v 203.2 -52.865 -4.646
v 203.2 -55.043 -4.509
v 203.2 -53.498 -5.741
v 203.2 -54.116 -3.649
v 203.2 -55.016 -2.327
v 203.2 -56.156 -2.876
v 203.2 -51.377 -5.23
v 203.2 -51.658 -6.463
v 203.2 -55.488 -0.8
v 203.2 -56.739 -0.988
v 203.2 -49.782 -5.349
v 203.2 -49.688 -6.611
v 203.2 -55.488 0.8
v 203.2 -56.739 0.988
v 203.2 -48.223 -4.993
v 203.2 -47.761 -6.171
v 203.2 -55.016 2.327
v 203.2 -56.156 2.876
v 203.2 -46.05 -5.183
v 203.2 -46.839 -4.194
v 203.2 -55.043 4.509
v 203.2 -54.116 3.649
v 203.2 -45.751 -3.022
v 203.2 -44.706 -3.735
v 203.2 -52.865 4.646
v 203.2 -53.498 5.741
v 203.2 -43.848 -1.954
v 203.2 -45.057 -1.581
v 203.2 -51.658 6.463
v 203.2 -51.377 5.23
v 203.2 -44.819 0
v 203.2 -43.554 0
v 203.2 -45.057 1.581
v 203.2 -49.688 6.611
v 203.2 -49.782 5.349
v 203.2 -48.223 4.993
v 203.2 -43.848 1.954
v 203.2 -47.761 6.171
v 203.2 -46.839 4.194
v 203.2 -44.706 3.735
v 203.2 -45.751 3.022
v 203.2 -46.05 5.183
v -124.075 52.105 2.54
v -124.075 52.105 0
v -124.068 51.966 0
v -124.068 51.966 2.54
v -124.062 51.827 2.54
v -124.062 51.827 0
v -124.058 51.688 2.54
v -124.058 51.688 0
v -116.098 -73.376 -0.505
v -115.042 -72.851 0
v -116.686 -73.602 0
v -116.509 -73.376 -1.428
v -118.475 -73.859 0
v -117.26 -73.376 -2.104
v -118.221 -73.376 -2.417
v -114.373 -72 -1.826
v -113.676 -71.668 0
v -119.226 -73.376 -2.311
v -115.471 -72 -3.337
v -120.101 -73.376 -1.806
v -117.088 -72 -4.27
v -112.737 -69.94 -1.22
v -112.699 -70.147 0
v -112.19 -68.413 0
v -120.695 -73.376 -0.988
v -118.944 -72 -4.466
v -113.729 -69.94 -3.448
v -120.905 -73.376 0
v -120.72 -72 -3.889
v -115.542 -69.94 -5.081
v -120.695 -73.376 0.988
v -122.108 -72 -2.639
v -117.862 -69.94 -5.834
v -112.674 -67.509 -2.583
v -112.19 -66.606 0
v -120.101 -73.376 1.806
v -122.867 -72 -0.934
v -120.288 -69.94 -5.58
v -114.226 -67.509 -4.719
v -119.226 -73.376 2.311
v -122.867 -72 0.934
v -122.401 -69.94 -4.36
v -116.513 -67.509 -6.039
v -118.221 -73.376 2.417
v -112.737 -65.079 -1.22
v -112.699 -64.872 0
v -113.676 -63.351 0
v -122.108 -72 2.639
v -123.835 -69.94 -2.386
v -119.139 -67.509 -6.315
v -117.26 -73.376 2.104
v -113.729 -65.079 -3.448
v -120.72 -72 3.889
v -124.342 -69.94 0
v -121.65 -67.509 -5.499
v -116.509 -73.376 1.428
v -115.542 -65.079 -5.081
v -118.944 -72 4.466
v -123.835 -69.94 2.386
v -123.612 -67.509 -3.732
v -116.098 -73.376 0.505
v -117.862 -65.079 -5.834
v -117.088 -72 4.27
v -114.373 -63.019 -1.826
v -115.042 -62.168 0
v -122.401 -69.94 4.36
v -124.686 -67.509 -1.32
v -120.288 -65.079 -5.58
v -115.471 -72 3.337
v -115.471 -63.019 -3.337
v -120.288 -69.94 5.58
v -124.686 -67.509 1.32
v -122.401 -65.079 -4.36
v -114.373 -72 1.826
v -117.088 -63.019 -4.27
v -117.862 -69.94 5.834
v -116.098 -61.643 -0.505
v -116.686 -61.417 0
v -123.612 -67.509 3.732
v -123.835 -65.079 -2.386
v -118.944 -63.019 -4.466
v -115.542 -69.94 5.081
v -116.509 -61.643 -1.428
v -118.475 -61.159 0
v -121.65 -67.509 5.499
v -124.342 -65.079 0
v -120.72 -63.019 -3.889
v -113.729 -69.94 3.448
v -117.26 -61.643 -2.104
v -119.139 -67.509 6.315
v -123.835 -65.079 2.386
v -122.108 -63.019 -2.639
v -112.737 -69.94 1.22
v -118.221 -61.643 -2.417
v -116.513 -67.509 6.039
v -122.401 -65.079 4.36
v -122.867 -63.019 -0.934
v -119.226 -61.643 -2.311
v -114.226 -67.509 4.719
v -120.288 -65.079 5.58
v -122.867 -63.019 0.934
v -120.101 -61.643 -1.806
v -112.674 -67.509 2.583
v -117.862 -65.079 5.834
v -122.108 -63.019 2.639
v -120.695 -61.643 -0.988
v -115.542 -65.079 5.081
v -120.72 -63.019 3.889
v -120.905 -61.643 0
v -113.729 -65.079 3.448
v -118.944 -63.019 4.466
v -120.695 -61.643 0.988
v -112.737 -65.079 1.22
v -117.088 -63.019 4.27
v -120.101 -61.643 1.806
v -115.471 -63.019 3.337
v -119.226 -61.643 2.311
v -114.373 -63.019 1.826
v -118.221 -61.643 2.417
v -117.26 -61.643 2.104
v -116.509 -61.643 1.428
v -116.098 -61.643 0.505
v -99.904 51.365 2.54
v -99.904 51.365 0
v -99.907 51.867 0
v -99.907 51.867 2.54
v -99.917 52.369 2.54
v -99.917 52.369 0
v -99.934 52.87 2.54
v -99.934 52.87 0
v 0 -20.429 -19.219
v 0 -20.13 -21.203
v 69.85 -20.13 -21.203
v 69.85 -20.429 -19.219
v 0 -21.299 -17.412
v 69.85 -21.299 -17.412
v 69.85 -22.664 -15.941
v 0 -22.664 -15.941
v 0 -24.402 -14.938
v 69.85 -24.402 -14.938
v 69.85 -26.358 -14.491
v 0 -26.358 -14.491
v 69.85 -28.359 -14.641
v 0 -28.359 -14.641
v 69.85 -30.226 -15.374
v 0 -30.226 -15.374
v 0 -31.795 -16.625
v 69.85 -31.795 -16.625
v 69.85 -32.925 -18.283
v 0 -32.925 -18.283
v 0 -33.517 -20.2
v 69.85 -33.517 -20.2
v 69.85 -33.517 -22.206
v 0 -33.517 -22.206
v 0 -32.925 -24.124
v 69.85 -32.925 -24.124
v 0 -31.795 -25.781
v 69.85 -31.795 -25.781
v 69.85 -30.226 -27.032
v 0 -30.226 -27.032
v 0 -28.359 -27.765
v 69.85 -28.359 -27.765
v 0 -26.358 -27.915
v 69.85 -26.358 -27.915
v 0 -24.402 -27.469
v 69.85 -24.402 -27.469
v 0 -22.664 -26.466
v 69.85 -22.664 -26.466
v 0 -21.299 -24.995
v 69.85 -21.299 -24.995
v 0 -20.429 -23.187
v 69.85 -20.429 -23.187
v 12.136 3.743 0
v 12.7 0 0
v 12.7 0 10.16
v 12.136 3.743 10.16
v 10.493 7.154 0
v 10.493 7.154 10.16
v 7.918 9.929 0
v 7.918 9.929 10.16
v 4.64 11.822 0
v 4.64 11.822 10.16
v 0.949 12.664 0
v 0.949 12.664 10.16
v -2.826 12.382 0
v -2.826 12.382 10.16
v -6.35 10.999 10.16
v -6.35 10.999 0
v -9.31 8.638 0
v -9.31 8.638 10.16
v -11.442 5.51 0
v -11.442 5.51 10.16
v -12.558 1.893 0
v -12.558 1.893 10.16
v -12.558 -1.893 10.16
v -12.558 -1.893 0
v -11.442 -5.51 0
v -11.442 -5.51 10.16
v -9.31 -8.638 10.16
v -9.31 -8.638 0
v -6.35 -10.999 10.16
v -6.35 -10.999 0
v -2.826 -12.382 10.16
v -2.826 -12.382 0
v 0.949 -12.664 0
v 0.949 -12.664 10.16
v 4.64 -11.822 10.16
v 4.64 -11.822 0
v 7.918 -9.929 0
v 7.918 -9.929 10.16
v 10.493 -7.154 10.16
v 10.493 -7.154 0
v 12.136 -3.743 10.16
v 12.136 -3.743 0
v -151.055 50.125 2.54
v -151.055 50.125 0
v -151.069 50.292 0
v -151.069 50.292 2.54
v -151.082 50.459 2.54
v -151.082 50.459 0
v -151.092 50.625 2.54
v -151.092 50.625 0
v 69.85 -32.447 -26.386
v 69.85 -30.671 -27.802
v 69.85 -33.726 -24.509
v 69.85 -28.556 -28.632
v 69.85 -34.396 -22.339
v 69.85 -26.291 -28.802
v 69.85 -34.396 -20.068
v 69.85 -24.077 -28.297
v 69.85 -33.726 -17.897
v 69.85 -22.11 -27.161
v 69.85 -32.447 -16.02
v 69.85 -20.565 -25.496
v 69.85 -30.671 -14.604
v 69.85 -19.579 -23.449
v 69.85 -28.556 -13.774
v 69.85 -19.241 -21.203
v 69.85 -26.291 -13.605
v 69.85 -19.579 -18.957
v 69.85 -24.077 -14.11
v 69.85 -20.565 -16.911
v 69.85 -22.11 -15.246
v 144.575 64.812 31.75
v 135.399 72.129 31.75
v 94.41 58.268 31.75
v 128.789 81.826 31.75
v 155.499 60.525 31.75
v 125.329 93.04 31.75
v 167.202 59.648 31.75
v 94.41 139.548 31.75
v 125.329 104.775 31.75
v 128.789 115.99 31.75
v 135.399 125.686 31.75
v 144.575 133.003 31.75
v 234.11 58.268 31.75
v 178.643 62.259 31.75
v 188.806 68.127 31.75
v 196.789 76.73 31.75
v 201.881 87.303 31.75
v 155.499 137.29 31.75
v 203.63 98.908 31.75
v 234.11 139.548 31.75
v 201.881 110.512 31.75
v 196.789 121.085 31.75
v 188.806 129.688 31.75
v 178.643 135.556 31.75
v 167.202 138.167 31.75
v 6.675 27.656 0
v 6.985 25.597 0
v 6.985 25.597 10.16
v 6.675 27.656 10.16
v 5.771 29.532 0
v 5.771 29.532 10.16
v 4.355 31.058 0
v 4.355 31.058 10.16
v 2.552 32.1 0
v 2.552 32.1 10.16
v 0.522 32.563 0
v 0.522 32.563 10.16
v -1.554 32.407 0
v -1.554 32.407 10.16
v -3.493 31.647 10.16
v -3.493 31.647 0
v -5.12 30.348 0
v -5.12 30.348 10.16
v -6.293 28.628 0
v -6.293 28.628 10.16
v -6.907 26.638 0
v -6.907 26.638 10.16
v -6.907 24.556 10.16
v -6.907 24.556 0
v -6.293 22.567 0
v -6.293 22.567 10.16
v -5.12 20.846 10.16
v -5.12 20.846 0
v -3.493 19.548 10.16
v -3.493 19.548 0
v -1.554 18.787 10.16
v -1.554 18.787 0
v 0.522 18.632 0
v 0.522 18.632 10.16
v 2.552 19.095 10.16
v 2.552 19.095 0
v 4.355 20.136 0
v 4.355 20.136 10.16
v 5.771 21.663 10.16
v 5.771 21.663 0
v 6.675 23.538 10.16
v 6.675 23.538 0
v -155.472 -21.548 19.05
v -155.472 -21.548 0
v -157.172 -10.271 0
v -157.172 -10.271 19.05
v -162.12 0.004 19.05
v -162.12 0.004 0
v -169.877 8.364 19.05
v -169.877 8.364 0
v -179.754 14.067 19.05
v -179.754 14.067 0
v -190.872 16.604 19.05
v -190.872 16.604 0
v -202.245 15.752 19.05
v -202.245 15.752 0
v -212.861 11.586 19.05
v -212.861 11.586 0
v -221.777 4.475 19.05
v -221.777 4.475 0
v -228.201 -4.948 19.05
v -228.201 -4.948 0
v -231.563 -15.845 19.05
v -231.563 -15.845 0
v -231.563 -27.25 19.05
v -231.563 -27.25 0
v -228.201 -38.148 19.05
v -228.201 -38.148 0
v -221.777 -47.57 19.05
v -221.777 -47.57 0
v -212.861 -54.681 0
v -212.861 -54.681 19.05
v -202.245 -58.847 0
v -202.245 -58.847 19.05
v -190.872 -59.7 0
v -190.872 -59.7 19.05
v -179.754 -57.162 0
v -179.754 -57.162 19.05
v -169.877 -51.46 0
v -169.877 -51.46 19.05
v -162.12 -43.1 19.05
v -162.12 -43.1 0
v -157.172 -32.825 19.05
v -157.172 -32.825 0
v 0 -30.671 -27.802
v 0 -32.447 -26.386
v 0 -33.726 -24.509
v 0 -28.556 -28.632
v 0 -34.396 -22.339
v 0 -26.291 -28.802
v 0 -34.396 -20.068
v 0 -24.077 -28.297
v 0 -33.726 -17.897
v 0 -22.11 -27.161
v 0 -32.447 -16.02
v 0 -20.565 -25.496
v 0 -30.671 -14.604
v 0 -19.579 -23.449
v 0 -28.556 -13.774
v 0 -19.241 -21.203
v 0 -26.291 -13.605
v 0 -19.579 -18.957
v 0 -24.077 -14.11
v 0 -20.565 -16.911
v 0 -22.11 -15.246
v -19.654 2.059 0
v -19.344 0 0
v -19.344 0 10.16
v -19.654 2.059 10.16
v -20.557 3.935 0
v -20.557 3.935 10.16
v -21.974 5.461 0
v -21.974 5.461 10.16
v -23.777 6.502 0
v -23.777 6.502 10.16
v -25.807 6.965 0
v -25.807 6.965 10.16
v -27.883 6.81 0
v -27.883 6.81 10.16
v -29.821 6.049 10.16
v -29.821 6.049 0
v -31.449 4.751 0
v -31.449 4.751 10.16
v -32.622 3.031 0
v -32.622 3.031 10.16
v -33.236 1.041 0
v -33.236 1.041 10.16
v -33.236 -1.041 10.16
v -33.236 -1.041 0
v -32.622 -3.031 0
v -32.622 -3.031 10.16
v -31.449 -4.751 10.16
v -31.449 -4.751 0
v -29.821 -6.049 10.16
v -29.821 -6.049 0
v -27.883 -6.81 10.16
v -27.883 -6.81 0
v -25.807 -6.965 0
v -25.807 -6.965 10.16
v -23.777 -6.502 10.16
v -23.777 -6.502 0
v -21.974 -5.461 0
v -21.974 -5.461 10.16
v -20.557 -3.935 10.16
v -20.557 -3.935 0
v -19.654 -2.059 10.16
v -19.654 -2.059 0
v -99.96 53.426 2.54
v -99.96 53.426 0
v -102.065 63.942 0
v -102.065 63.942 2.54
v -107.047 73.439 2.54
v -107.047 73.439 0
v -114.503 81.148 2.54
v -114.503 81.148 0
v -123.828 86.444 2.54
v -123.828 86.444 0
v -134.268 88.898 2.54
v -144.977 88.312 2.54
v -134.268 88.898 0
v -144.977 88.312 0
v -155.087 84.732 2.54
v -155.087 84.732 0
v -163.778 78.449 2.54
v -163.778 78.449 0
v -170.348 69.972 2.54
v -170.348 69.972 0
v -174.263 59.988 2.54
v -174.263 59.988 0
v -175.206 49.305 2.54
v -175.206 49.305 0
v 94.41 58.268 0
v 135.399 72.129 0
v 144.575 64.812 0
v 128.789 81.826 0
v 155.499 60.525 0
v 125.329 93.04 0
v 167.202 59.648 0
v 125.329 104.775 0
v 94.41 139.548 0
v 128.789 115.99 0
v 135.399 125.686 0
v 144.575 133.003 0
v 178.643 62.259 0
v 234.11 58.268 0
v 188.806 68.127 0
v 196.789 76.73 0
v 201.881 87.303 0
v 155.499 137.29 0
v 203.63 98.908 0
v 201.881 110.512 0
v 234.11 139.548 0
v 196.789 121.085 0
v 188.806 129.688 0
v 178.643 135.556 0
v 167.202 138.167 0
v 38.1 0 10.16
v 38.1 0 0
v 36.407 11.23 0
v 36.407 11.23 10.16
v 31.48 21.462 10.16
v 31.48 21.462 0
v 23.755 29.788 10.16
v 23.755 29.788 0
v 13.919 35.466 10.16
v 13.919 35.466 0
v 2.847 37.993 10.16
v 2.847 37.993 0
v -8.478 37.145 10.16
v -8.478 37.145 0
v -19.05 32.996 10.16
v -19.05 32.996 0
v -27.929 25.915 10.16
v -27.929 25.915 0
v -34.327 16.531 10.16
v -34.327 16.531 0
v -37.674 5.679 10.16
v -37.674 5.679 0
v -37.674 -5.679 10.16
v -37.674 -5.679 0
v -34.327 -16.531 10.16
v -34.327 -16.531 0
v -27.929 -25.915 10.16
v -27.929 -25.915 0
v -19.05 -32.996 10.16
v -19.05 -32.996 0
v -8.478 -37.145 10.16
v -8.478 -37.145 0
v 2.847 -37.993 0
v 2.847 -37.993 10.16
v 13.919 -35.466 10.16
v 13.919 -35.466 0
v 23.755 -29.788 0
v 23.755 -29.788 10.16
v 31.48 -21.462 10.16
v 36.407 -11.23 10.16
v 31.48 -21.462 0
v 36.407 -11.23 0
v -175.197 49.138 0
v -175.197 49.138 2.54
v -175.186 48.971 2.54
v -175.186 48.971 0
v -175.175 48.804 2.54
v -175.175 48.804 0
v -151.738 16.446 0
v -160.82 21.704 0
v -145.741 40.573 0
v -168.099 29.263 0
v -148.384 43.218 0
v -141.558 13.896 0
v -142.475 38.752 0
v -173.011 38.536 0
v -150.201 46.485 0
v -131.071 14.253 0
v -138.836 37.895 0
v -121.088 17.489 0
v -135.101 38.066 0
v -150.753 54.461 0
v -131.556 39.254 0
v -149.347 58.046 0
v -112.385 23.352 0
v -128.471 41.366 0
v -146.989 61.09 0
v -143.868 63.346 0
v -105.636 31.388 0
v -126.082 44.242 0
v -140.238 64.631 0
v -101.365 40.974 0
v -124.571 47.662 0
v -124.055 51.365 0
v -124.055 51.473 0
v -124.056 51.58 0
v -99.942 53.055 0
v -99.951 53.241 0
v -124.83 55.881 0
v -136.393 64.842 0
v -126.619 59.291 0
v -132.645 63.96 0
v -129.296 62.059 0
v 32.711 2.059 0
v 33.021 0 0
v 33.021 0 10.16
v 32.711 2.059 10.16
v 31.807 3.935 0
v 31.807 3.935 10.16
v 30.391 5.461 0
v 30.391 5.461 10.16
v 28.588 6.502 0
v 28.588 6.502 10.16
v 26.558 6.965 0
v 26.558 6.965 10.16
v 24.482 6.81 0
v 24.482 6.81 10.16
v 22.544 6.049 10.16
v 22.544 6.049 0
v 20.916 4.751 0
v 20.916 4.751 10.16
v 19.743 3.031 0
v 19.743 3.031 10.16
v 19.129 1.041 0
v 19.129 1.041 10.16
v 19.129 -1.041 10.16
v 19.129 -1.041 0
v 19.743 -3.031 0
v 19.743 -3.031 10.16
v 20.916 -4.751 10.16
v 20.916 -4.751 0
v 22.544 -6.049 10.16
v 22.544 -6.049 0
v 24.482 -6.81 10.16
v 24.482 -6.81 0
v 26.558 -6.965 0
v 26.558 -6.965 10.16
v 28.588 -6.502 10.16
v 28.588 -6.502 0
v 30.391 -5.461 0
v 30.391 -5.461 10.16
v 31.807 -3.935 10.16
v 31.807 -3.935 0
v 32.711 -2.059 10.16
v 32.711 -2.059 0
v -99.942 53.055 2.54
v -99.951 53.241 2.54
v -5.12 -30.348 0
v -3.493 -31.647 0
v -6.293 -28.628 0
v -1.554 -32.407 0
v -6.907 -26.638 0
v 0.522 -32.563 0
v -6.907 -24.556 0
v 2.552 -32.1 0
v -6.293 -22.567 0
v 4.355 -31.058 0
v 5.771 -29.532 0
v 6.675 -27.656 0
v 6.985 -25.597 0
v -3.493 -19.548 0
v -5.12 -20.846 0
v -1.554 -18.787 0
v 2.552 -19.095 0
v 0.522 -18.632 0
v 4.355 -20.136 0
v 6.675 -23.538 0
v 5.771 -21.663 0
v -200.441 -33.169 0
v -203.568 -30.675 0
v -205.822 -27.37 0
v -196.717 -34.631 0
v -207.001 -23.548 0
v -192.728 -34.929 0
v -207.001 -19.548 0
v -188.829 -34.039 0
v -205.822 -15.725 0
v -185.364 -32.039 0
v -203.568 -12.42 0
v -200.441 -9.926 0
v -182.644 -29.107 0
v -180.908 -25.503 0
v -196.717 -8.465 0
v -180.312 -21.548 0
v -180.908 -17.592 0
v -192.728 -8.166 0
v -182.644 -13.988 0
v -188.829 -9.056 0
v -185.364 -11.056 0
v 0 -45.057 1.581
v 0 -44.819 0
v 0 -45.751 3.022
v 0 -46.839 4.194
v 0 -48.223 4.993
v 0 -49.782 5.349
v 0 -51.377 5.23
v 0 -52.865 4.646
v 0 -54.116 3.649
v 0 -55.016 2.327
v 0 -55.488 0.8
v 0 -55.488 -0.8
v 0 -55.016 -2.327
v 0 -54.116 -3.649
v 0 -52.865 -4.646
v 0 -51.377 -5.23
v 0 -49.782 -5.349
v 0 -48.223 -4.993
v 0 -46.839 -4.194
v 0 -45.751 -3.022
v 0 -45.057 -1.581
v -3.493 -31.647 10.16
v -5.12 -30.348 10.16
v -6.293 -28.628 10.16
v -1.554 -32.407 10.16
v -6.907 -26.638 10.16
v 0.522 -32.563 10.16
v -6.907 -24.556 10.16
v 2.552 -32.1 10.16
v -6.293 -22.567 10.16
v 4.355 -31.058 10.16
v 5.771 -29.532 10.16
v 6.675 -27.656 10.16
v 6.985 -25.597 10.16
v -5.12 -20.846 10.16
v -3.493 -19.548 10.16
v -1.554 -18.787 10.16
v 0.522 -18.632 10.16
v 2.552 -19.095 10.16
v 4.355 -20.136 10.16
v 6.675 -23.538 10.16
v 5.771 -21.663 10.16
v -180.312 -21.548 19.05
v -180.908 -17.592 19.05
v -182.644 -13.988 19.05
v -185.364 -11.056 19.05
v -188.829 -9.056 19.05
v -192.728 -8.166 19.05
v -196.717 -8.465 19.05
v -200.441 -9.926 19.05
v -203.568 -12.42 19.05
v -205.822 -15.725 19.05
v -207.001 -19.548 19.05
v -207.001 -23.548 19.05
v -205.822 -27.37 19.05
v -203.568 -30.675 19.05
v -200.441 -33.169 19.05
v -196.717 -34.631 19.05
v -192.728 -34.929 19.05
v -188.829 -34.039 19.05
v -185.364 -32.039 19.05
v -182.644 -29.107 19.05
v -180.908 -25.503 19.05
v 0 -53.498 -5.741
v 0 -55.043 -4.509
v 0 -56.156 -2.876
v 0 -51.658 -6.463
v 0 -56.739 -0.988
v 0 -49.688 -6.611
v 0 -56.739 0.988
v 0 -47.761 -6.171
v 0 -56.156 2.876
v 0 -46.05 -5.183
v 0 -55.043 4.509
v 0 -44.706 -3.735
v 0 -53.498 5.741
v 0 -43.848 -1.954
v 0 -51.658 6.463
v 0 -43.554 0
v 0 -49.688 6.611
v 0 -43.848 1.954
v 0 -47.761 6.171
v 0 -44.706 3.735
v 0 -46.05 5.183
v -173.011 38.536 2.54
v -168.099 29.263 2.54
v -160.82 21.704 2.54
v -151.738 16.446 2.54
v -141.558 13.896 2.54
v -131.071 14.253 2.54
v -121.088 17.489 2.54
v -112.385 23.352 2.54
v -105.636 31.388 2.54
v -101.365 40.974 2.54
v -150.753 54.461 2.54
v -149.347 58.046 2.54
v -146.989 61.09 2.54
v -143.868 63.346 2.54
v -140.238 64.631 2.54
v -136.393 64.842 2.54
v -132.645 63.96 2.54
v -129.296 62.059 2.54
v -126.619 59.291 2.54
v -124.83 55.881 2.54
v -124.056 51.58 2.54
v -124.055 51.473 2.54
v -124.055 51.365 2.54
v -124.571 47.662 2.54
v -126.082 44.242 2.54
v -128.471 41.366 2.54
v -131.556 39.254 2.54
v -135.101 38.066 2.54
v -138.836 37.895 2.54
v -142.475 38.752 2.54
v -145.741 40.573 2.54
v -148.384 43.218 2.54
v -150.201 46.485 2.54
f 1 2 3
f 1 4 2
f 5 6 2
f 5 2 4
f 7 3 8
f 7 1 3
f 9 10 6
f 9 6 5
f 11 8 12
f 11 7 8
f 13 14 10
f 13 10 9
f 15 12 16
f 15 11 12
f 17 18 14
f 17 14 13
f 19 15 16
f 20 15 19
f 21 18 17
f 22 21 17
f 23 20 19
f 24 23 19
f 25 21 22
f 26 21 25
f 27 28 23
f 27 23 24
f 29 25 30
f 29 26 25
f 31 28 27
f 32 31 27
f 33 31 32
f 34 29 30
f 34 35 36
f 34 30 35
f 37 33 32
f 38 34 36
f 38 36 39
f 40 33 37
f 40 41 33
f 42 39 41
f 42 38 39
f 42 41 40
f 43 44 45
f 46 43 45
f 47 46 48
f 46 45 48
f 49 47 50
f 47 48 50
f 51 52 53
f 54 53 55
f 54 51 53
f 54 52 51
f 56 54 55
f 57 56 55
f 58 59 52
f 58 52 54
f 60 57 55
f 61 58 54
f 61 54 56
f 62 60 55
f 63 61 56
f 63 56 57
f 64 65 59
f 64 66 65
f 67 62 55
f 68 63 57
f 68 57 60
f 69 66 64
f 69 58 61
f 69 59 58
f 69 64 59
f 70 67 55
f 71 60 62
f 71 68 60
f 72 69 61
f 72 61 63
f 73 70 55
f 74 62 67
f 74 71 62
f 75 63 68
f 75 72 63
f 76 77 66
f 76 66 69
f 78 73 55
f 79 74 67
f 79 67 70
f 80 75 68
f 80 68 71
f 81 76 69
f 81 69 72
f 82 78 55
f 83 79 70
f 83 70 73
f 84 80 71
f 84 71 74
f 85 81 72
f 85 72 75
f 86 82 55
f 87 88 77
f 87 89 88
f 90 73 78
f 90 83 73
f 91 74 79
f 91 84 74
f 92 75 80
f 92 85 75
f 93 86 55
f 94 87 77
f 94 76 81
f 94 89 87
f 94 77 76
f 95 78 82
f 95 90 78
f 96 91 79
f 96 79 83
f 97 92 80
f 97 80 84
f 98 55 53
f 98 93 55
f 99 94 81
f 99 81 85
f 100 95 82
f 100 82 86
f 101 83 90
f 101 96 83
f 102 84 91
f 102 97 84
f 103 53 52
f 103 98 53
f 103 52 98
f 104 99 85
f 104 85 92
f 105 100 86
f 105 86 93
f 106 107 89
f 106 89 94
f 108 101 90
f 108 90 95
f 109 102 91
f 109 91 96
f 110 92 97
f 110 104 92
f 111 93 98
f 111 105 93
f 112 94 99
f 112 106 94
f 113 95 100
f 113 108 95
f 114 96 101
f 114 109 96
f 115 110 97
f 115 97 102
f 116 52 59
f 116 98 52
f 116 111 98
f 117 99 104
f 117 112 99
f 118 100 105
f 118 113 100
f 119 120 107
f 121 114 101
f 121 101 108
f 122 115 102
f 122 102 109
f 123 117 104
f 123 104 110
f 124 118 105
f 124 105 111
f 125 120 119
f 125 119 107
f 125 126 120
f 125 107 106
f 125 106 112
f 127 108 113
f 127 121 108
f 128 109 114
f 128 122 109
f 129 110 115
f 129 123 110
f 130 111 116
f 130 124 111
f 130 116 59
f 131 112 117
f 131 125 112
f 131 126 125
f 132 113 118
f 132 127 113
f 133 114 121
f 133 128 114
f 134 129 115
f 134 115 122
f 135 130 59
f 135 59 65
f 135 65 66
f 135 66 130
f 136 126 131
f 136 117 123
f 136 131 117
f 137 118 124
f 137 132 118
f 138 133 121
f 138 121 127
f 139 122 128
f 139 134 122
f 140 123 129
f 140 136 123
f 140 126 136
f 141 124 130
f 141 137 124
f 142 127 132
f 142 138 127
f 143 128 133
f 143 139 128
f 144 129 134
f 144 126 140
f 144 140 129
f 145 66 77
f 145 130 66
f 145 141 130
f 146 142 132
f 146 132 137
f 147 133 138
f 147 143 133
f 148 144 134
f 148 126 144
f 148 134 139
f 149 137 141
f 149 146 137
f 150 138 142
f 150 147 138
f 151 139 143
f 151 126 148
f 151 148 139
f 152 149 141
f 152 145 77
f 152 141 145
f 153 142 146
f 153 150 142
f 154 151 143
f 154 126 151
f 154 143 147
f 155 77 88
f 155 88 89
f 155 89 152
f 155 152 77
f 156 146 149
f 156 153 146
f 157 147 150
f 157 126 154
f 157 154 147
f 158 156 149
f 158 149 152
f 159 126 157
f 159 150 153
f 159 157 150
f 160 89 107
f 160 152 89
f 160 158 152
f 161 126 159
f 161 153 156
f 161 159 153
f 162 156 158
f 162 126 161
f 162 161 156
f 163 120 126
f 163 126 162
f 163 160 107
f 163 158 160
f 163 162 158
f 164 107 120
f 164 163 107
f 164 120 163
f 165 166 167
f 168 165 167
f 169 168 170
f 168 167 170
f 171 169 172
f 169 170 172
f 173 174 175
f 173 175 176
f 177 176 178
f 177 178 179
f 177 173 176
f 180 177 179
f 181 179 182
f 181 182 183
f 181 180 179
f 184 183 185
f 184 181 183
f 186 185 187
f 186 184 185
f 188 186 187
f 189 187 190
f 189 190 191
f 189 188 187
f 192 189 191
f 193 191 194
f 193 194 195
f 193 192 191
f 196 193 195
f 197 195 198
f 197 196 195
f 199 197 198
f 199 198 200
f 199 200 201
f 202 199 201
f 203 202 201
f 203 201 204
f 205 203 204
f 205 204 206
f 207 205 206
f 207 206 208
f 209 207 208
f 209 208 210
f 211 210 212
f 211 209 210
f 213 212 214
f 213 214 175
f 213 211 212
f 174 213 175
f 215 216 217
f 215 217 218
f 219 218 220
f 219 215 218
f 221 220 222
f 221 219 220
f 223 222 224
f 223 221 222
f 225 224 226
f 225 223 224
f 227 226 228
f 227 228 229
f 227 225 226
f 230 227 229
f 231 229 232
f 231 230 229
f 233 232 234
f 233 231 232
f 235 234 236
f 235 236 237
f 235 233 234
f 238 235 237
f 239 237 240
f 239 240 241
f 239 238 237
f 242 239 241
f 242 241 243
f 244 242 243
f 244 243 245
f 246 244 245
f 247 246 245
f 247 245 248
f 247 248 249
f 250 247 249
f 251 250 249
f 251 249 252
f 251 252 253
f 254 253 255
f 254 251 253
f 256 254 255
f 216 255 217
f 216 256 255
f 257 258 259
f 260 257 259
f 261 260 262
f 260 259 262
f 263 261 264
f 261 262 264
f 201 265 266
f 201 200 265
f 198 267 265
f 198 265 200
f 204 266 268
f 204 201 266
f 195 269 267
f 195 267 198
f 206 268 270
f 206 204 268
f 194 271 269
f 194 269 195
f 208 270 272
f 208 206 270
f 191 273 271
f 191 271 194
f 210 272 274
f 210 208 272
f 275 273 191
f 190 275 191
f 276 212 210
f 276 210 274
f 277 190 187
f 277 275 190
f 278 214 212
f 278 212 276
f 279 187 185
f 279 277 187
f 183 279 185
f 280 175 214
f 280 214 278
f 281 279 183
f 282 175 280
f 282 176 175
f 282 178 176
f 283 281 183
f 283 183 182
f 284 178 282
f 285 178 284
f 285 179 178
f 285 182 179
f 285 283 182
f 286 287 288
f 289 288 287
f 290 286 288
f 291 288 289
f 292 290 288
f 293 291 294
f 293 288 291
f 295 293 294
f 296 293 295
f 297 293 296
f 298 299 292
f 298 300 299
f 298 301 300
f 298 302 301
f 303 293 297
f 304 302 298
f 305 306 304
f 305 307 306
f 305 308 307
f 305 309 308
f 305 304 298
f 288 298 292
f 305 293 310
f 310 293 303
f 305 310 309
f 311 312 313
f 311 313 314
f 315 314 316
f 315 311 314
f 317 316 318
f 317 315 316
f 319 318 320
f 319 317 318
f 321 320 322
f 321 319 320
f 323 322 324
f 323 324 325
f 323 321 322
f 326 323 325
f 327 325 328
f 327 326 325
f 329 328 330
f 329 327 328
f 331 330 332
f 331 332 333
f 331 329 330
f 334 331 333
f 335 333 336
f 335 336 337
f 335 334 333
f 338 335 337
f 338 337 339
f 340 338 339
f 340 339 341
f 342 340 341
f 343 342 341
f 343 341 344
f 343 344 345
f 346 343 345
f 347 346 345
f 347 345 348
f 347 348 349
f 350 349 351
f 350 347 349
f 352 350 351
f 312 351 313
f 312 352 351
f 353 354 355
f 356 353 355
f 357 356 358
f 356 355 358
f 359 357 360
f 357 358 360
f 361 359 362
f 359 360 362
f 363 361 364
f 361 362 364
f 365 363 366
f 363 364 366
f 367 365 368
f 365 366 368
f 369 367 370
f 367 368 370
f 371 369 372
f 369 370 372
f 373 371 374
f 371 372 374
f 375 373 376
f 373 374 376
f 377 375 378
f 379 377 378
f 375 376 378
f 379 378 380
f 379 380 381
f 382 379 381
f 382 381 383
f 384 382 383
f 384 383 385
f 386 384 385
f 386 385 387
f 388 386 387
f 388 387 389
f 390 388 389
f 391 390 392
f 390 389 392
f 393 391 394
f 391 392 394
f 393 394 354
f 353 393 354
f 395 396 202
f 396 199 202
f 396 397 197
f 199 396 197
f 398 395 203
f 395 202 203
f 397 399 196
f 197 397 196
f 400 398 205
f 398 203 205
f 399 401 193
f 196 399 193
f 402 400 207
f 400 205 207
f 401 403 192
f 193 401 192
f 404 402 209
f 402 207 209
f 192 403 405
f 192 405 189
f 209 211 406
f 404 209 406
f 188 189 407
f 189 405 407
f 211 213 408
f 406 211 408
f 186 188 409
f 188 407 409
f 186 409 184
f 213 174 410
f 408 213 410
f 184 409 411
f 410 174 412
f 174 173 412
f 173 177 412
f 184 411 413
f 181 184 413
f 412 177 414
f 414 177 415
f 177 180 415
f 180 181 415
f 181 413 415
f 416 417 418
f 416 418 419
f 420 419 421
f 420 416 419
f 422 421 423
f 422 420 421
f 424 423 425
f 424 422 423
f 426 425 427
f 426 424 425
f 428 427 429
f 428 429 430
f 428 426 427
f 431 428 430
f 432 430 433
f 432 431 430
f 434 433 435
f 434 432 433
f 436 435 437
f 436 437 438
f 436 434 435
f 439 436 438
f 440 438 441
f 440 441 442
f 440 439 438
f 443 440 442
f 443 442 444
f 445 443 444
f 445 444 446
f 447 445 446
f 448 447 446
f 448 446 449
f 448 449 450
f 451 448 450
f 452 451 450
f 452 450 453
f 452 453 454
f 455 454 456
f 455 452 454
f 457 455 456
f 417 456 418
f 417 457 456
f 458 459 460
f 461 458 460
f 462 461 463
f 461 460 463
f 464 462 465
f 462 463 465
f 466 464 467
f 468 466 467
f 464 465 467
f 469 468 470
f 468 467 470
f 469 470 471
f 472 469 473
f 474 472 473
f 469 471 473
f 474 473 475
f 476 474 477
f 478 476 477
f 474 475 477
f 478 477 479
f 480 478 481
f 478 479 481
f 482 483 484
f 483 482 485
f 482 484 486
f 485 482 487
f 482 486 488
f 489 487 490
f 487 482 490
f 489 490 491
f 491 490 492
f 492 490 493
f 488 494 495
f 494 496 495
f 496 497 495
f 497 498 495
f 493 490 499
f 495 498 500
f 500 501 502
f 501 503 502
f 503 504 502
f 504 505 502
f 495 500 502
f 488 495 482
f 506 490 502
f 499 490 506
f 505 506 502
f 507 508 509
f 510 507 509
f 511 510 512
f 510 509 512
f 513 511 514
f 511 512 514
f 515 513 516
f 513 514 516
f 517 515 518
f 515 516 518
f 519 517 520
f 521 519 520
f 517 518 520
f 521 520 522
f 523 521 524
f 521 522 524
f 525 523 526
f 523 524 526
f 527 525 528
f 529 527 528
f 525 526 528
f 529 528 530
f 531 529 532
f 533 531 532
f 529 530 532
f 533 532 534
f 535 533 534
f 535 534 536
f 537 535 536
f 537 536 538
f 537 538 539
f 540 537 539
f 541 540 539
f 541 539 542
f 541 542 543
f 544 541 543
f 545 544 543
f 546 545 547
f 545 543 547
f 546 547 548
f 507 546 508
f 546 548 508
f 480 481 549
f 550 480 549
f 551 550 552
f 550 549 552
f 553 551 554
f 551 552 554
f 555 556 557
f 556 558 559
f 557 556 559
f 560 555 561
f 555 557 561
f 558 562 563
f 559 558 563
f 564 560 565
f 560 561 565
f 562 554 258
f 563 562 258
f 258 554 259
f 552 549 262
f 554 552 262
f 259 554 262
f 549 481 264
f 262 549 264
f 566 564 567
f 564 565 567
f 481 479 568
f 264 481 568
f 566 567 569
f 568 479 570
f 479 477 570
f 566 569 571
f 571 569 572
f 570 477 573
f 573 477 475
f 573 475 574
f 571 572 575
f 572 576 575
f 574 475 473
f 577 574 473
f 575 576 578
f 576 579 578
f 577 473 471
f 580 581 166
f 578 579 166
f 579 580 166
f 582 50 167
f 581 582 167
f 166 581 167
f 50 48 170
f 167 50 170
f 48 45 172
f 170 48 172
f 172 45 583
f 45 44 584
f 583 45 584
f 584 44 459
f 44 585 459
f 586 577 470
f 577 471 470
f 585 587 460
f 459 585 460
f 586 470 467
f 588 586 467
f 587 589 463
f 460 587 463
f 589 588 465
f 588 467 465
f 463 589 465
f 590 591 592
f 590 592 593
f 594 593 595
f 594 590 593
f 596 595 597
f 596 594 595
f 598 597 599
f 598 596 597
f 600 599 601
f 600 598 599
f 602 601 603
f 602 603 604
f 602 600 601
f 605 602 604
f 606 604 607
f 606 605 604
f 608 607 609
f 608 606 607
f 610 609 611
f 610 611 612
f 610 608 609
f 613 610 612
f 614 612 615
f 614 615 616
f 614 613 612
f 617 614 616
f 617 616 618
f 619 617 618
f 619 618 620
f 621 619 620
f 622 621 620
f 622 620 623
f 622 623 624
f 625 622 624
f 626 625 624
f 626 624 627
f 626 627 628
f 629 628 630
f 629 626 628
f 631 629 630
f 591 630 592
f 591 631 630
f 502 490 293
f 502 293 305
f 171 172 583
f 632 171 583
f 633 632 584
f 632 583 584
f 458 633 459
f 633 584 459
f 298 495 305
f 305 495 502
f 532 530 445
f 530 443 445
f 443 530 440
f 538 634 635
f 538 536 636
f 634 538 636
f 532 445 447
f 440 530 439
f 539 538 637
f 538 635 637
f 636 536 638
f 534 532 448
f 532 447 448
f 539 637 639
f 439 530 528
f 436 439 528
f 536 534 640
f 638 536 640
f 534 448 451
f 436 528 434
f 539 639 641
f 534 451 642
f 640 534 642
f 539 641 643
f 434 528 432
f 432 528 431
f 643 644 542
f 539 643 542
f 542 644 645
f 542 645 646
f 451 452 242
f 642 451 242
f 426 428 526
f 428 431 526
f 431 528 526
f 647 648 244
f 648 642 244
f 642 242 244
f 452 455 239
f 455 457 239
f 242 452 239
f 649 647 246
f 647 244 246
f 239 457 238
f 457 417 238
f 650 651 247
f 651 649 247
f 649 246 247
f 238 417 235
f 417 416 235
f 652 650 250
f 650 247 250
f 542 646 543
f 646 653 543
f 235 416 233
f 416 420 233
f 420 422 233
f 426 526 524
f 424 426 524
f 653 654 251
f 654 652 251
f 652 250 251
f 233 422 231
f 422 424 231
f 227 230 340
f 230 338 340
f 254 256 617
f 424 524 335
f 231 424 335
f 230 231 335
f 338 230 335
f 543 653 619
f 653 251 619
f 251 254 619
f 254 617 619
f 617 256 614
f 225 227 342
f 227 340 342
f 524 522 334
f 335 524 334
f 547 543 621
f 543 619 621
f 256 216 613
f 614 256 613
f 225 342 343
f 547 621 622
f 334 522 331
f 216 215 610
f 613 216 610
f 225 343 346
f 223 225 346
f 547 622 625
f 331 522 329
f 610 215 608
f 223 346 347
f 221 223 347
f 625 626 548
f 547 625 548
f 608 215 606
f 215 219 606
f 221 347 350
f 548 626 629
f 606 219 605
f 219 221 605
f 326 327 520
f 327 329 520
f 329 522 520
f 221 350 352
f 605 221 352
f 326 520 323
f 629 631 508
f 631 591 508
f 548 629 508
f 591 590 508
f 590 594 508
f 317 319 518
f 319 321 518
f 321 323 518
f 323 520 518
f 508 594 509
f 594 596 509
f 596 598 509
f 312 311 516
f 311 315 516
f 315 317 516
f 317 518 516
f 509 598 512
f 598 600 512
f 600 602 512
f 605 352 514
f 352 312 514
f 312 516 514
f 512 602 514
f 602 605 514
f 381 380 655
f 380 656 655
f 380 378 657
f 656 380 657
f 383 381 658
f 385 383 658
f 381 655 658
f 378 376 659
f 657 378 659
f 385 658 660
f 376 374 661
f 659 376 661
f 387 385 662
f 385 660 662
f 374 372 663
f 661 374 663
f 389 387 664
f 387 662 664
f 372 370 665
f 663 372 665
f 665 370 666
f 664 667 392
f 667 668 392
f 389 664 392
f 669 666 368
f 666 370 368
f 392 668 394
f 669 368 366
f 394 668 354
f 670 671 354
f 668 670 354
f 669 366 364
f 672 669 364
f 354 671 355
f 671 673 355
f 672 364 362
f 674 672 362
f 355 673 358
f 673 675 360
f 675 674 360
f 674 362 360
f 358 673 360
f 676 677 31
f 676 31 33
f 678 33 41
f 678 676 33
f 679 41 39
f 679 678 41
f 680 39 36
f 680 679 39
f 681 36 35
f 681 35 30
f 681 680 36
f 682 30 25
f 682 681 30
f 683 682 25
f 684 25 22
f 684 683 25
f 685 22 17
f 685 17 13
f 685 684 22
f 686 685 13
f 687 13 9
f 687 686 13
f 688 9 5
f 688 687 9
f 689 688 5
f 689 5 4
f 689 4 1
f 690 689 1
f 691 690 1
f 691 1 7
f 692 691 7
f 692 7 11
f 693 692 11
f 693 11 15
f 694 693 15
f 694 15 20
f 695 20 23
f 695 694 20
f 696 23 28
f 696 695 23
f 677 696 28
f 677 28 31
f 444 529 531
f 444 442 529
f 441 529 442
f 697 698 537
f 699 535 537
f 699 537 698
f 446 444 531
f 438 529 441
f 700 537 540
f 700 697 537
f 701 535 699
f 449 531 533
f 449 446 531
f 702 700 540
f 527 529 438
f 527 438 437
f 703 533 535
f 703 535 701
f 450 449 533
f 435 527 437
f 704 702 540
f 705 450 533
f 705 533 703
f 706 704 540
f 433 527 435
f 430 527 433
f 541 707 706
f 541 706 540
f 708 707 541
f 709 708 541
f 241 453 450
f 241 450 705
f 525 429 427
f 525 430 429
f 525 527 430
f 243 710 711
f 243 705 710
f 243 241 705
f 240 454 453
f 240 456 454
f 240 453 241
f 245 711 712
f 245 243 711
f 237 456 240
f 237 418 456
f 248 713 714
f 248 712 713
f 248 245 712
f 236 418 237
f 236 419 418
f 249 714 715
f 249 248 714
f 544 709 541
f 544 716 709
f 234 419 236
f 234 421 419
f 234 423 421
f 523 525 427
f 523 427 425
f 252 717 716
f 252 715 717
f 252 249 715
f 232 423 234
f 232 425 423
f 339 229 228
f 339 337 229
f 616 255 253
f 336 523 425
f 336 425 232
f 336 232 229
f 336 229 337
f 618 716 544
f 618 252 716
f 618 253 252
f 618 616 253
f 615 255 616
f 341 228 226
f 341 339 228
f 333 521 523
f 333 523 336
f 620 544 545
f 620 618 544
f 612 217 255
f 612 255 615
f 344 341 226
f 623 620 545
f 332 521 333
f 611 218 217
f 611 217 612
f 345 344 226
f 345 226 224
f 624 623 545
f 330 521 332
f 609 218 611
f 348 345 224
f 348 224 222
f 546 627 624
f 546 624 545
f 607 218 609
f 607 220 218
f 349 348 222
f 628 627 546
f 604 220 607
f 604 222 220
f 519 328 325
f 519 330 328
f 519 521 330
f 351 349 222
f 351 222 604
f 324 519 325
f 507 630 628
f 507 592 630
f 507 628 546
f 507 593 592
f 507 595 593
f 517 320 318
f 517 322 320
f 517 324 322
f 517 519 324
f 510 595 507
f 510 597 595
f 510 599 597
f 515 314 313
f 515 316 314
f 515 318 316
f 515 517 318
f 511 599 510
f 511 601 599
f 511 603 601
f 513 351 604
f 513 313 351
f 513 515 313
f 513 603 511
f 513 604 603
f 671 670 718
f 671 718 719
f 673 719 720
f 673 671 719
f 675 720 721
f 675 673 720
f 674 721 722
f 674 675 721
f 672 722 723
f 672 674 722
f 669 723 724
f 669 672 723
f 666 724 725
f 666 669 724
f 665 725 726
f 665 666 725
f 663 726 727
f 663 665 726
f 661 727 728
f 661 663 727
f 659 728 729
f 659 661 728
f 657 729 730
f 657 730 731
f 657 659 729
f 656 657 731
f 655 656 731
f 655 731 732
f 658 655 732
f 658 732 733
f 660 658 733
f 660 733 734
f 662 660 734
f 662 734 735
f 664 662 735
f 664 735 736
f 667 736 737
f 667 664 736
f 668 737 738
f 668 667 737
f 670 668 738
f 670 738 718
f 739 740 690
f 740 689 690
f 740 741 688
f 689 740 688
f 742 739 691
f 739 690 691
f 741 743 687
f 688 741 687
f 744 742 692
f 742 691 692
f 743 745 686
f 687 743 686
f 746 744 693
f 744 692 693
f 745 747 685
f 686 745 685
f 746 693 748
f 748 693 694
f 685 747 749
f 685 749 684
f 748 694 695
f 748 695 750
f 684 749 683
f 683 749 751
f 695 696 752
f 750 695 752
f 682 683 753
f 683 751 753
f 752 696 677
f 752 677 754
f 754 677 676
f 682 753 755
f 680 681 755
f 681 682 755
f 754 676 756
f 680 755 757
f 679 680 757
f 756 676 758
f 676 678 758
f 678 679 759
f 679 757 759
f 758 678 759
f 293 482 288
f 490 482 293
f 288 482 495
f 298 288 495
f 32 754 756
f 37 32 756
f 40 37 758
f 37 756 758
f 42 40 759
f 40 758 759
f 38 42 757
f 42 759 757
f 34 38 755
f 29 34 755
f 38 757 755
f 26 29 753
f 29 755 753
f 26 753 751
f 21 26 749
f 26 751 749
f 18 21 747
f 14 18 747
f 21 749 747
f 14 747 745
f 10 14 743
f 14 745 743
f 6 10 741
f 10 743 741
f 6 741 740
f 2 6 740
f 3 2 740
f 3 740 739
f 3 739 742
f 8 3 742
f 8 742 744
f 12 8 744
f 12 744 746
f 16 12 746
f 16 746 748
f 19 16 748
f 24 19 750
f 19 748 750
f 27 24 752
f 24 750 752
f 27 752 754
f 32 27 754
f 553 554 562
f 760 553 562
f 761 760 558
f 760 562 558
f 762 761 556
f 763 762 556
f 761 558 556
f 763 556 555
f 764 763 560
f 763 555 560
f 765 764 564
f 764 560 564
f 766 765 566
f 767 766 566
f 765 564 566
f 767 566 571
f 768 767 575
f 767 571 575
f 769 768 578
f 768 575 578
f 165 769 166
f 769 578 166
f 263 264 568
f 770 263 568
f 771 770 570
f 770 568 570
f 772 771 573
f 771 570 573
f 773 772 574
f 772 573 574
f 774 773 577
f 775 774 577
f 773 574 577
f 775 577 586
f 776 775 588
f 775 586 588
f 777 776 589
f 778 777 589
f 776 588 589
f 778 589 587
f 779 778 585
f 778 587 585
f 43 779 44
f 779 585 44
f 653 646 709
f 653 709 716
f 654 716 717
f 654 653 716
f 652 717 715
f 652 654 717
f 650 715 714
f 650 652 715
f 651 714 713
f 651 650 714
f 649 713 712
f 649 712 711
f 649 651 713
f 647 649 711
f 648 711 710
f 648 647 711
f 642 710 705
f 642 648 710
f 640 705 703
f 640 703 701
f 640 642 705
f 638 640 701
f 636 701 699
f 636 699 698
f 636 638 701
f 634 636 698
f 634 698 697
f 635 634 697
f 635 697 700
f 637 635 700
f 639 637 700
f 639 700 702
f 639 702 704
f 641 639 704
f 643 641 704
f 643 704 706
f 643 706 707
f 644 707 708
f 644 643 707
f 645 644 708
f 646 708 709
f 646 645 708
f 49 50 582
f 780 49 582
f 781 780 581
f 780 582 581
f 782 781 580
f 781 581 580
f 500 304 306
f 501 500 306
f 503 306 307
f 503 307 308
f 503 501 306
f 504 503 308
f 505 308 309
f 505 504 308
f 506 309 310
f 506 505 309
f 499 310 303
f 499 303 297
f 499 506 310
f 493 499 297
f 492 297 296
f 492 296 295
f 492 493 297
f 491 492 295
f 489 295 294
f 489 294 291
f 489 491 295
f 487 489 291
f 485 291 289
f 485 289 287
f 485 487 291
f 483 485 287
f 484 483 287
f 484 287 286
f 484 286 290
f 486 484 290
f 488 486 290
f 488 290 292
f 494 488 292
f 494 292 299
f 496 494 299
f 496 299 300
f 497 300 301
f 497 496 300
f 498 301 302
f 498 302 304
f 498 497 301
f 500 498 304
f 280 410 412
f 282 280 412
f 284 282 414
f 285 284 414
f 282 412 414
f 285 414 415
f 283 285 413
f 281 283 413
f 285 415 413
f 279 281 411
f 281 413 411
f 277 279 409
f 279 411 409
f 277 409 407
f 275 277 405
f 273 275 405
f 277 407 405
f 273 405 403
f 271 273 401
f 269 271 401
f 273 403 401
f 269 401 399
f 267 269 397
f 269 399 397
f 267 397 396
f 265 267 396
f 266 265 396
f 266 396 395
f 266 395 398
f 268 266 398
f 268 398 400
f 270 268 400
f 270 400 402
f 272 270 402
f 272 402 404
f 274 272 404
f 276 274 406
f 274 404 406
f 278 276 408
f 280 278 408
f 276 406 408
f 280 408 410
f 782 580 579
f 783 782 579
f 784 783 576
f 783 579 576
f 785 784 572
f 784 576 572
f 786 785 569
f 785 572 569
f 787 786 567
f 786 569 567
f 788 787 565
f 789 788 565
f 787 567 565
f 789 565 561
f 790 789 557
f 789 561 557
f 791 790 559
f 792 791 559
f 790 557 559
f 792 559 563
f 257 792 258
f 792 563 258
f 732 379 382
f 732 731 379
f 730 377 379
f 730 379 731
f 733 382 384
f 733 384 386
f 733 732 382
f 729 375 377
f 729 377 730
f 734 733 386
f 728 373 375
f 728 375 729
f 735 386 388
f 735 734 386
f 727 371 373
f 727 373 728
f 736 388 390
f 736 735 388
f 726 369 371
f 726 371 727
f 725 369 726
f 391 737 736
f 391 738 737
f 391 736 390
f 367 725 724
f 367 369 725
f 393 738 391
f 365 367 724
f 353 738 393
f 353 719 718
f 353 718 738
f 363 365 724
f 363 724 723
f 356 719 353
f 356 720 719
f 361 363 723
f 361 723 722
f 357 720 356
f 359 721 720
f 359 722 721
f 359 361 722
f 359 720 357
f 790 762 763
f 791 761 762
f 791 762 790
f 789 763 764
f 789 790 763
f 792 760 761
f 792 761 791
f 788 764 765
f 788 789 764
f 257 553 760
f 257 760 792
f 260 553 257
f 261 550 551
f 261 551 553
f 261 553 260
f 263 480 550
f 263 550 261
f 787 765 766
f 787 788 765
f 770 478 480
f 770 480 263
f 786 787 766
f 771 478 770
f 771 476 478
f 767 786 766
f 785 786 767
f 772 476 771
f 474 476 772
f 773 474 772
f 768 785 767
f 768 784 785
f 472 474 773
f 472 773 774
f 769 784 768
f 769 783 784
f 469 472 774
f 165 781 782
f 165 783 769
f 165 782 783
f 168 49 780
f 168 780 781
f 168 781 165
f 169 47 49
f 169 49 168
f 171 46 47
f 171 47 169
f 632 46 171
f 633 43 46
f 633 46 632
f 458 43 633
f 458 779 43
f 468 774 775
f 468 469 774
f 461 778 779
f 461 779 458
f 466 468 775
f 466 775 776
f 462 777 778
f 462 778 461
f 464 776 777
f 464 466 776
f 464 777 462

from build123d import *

# Parameters (mm, degrees)
F0_R      = 38.1
F0_R_2    = 6.985
F0_R_3    = 12.7
F1_DEPTH  = 10.16
F3_DEPTH  = 2.54
F6_R      = 6.629655
F6_R_2    = 5.364271
F7_DEPTH  = 203.2
F8_R      = 38.259047
F8_R_2    = 13.4193
F9_DEPTH  = 19.05
F10_W     = 139.7
F10_H     = 81.28
F10_R     = 39.37
F11_DEPTH = 31.75
F12_R     = 7.62
F12_R_2   = 6.731
F13_DEPTH = 69.85


with BuildPart() as f1:
    # F0 (on Top) → F1 (new body)
    with BuildSketch(Plane.XY):
        Circle(F0_R)
        with Locations((0, -25.597349)):
            Circle(F0_R_2, mode=Mode.SUBTRACT)
        with Locations((-26.328702, 0)):
            Circle(F0_R_2, mode=Mode.SUBTRACT)
        Circle(F0_R_3, mode=Mode.SUBTRACT)
        with Locations((26.03616, 0)):
            Circle(F0_R_2, mode=Mode.SUBTRACT)
        with Locations((0, 25.597349)):
            Circle(F0_R_2, mode=Mode.SUBTRACT)
    extrude(amount=F1_DEPTH)


with BuildPart() as f3:
    # F2 (on Top) → F3 (new body)
    with BuildSketch(Plane.XY):
        with BuildLine():
            ThreePointArc((-175.175314, 48.804403), (-136.302068, 13.707953), (-99.904105, 51.365334))
            ThreePointArc((-99.904105, 51.365334), (-99.911622, 52.117931), (-99.934169, 52.870227))
            Line((-99.934169, 52.870227), (-124.058357, 51.688002))
            ThreePointArc((-124.058357, 51.688002), (-124.055471, 51.526679), (-124.054508, 51.365334))
            ThreePointArc((-124.054508, 51.365334), (-136.962644, 37.850811), (-151.055098, 50.125379))
            Line((-151.055098, 50.125379), (-175.175314, 48.804403))
        make_face()
        with BuildLine():
            Line((-124.058357, 51.688002), (-99.934169, 52.870227))
            ThreePointArc((-99.934169, 52.870227), (-99.946299, 53.147987), (-99.960477, 53.425651))
            Line((-99.960477, 53.425651), (-124.074744, 52.105001))
            ThreePointArc((-124.074744, 52.105001), (-124.064942, 51.896565), (-124.058357, 51.688002))
        make_face()
        with BuildLine():
            ThreePointArc((-175.206056, 49.304727), (-175.191517, 49.054514), (-175.175314, 48.804403))
            Line((-175.175314, 48.804403), (-151.055098, 50.125379))
            ThreePointArc((-151.055098, 50.125379), (-151.07576, 50.375208), (-151.091789, 50.625377))
            Line((-151.091789, 50.625377), (-175.206056, 49.304727))
        make_face()
        with BuildLine():
            Line((-124.074744, 52.105001), (-99.960477, 53.425651))
            ThreePointArc((-99.960477, 53.425651), (-139.643737, 88.988124), (-175.206056, 49.304727))
            Line((-175.206056, 49.304727), (-151.091789, 50.625377))
            ThreePointArc((-151.091789, 50.625377), (-138.323087, 64.873857), (-124.074744, 52.105001))
        make_face()
    extrude(amount=F3_DEPTH)


with BuildPart() as f5:
    # F4 (on Top) → F5 (revolve)
    with BuildSketch(Plane.XY):
        with BuildLine():
            Line((-118.475139, -61.159487), (-118.475139, -73.859487))
            ThreePointArc((-118.475139, -73.859487), (-112.125139, -67.509487), (-118.475139, -61.159487))
        make_face()
    revolve(axis=Axis((-118.475139, -67.509487, 0), (0, 1, 0)))


with BuildPart() as f7:
    # F6 (on Right) → F7 (new body)
    with BuildSketch(Plane.YZ):
        with Locations((-50.183225, 0)):
            Circle(F6_R)
        with Locations((-50.183225, 0)):
            Circle(F6_R_2, mode=Mode.SUBTRACT)
    extrude(amount=F7_DEPTH)


with BuildPart() as f9:
    # F8 (on Top) → F9 (new body)
    with BuildSketch(Plane.XY):
        with Locations((-193.731189, -21.547653)):
            Circle(F8_R)
        with Locations((-193.731189, -21.547653)):
            Circle(F8_R_2, mode=Mode.SUBTRACT)
    extrude(amount=F9_DEPTH)


with BuildPart() as f11:
    # F10 (on Top) → F11 (new body)
    with BuildSketch(Plane.XY):
        with Locations((164.259662, 98.907554)):
            Rectangle(F10_W, F10_H)
        with Locations((164.259662, 98.907554)):
            Circle(F10_R, mode=Mode.SUBTRACT)
    extrude(amount=F11_DEPTH)


with BuildPart() as f13:
    # F12 (on Right) → F13 (new body)
    with BuildSketch(Plane.YZ):
        with Locations((-26.860751, -21.203257)):
            Circle(F12_R)
        with Locations((-26.860751, -21.203257)):
            Circle(F12_R_2, mode=Mode.SUBTRACT)
    extrude(amount=F13_DEPTH)


solid = Compound([f1.part, f3.part, f5.part, f7.part, f9.part, f11.part, f13.part])
